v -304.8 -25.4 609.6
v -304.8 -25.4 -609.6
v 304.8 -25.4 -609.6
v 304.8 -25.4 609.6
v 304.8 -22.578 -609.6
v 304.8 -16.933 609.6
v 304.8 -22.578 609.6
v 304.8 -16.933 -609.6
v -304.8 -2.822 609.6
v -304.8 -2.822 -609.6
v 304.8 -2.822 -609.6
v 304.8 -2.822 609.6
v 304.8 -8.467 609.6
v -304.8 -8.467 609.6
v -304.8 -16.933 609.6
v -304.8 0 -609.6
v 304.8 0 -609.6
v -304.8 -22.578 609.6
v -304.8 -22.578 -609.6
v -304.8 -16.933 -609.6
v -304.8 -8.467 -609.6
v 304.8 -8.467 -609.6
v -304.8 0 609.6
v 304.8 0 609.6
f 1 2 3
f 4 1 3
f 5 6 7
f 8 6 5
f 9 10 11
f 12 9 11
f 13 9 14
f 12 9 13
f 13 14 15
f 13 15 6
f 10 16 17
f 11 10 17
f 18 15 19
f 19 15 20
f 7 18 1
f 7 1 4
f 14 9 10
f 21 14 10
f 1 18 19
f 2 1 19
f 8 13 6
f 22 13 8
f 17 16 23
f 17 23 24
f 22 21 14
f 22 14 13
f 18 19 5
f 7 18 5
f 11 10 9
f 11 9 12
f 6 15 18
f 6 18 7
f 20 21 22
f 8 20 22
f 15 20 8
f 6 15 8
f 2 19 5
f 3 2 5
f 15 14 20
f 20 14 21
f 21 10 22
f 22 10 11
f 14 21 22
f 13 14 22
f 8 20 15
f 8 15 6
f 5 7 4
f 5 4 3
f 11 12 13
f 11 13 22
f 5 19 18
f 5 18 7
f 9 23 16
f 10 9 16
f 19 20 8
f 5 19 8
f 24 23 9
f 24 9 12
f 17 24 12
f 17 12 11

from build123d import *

# Parameters (mm, degrees)
SKETCH3_W                = 609.6
SKETCH3_H                = 1219.2
BOSS_EXTRUDE1_DEPTH      = 25.4
SPLIT1_SURFACE_1_1_BACK  = 1364.344
SPLIT1_SURFACE_1_1_DEPTH = 2728.688
SPLIT1_SURFACE_1_2_BACK  = 1364.344
SPLIT1_SURFACE_1_2_DEPTH = 2728.688
SPLIT1_SURFACE_2_3_BACK  = 1364.344
SPLIT1_SURFACE_2_3_DEPTH = 2728.688
SPLIT1_SURFACE_2_4_BACK  = 1364.344
SPLIT1_SURFACE_2_4_DEPTH = 2728.688
SPLIT1_SURFACE_3_5_BACK  = 1364.344
SPLIT1_SURFACE_3_5_DEPTH = 2728.688
SPLIT1_SURFACE_3_6_BACK  = 1364.344
SPLIT1_SURFACE_3_6_DEPTH = 2728.688
SPLIT1_SURFACE_4_7_BACK  = 1364.344
SPLIT1_SURFACE_4_7_DEPTH = 2728.688
SPLIT1_SURFACE_4_8_BACK  = 1364.344
SPLIT1_SURFACE_4_8_DEPTH = 2728.688


with BuildPart() as part:
    # Sketch3 → Boss-Extrude1 (new body)
    with BuildSketch(Plane(origin=(0, 0, 0), x_dir=(1, 0, 0), z_dir=(0, 1, 0))):
        Rectangle(SKETCH3_W, SKETCH3_H)
    extrude(amount=-BOSS_EXTRUDE1_DEPTH)


with BuildPart() as body_2:
    # Split1: the piece behind the surface
    add(part.part)
    # Split1 surface 1: a surface, the sketch's curves swept straight by 2728.688 mm
    with BuildLine(Plane.XY.offset(-SPLIT1_SURFACE_1_1_BACK), mode=Mode.PRIVATE) as split1_surface_1_1_path:
        Line((-335.28, -22.577777778), (335.28, -22.577777778))
    split1_surface_1_1 = Shell.extrude(split1_surface_1_1_path.wire(), (0 * SPLIT1_SURFACE_1_1_DEPTH, 0 * SPLIT1_SURFACE_1_1_DEPTH, 1 * SPLIT1_SURFACE_1_1_DEPTH))
    split(bisect_by=split1_surface_1_1, keep=Keep.BOTTOM)


with BuildPart() as part_1:
    add(part.part)

    # Split1: split by a surface, the side it looks to stays
    # Split1 surface 1: a surface, the sketch's curves swept straight by 2728.688 mm
    with BuildLine(Plane.XY.offset(-SPLIT1_SURFACE_1_2_BACK), mode=Mode.PRIVATE) as split1_surface_1_2_path:
        Line((-335.28, -22.577777778), (335.28, -22.577777778))
    split1_surface_1_2 = Shell.extrude(split1_surface_1_2_path.wire(), (0 * SPLIT1_SURFACE_1_2_DEPTH, 0 * SPLIT1_SURFACE_1_2_DEPTH, 1 * SPLIT1_SURFACE_1_2_DEPTH))
    split(bisect_by=split1_surface_1_2, keep=Keep.TOP)


with BuildPart() as body_3:
    # Split1 2: the piece behind the surface
    add(part_1.part)
    # Split1 surface 2: a surface, the sketch's curves swept straight by 2728.688 mm
    with BuildLine(Plane.XY.offset(-SPLIT1_SURFACE_2_3_BACK), mode=Mode.PRIVATE) as split1_surface_2_3_path:
        Line((-335.28, -16.933333333), (335.28, -16.933333333))
    split1_surface_2_3 = Shell.extrude(split1_surface_2_3_path.wire(), (0 * SPLIT1_SURFACE_2_3_DEPTH, 0 * SPLIT1_SURFACE_2_3_DEPTH, 1 * SPLIT1_SURFACE_2_3_DEPTH))
    split(bisect_by=split1_surface_2_3, keep=Keep.BOTTOM)


with BuildPart() as part_2:
    add(part_1.part)

    # Split1 2: split by a surface, the side it looks to stays
    # Split1 surface 2: a surface, the sketch's curves swept straight by 2728.688 mm
    with BuildLine(Plane.XY.offset(-SPLIT1_SURFACE_2_4_BACK), mode=Mode.PRIVATE) as split1_surface_2_4_path:
        Line((-335.28, -16.933333333), (335.28, -16.933333333))
    split1_surface_2_4 = Shell.extrude(split1_surface_2_4_path.wire(), (0 * SPLIT1_SURFACE_2_4_DEPTH, 0 * SPLIT1_SURFACE_2_4_DEPTH, 1 * SPLIT1_SURFACE_2_4_DEPTH))
    split(bisect_by=split1_surface_2_4, keep=Keep.TOP)


with BuildPart() as body_4_2:
    # Split1 3: the piece behind the surface
    add(part_2.part)
    # Split1 surface 3: a surface, the sketch's curves swept straight by 2728.688 mm
    with BuildLine(Plane.XY.offset(-SPLIT1_SURFACE_3_5_BACK), mode=Mode.PRIVATE) as split1_surface_3_5_path:
        Line((-335.28, -2.822222222), (335.28, -2.822222222))
    split1_surface_3_5 = Shell.extrude(split1_surface_3_5_path.wire(), (0 * SPLIT1_SURFACE_3_5_DEPTH, 0 * SPLIT1_SURFACE_3_5_DEPTH, 1 * SPLIT1_SURFACE_3_5_DEPTH))
    split(bisect_by=split1_surface_3_5, keep=Keep.BOTTOM)


with BuildPart() as part_3:
    add(part_2.part)

    # Split1 3: split by a surface, the side it looks to stays
    # Split1 surface 3: a surface, the sketch's curves swept straight by 2728.688 mm
    with BuildLine(Plane.XY.offset(-SPLIT1_SURFACE_3_6_BACK), mode=Mode.PRIVATE) as split1_surface_3_6_path:
        Line((-335.28, -2.822222222), (335.28, -2.822222222))
    split1_surface_3_6 = Shell.extrude(split1_surface_3_6_path.wire(), (0 * SPLIT1_SURFACE_3_6_DEPTH, 0 * SPLIT1_SURFACE_3_6_DEPTH, 1 * SPLIT1_SURFACE_3_6_DEPTH))
    split(bisect_by=split1_surface_3_6, keep=Keep.TOP)


with BuildPart() as body_5_2:
    # Split1 4 body 4 2: the piece behind the surface
    add(body_4_2.part)
    # Split1 surface 4: a surface, the sketch's curves swept straight by 2728.688 mm
    with BuildLine(Plane.XY.offset(-SPLIT1_SURFACE_4_7_BACK), mode=Mode.PRIVATE) as split1_surface_4_7_path:
        Line((-335.28, -8.466666667), (335.28, -8.466666667))
    split1_surface_4_7 = Shell.extrude(split1_surface_4_7_path.wire(), (0 * SPLIT1_SURFACE_4_7_DEPTH, 0 * SPLIT1_SURFACE_4_7_DEPTH, 1 * SPLIT1_SURFACE_4_7_DEPTH))
    split(bisect_by=split1_surface_4_7, keep=Keep.BOTTOM)


with BuildPart() as body_4_2_1:
    add(body_4_2.part)

    # Split1 4 body 4 2: split by a surface, the side it looks to stays
    # Split1 surface 4: a surface, the sketch's curves swept straight by 2728.688 mm
    with BuildLine(Plane.XY.offset(-SPLIT1_SURFACE_4_8_BACK), mode=Mode.PRIVATE) as split1_surface_4_8_path:
        Line((-335.28, -8.466666667), (335.28, -8.466666667))
    split1_surface_4_8 = Shell.extrude(split1_surface_4_8_path.wire(), (0 * SPLIT1_SURFACE_4_8_DEPTH, 0 * SPLIT1_SURFACE_4_8_DEPTH, 1 * SPLIT1_SURFACE_4_8_DEPTH))
    split(bisect_by=split1_surface_4_8, keep=Keep.TOP)


solid = Compound([body_2.part, body_3.part, part_3.part, body_5_2.part, body_4_2_1.part])
